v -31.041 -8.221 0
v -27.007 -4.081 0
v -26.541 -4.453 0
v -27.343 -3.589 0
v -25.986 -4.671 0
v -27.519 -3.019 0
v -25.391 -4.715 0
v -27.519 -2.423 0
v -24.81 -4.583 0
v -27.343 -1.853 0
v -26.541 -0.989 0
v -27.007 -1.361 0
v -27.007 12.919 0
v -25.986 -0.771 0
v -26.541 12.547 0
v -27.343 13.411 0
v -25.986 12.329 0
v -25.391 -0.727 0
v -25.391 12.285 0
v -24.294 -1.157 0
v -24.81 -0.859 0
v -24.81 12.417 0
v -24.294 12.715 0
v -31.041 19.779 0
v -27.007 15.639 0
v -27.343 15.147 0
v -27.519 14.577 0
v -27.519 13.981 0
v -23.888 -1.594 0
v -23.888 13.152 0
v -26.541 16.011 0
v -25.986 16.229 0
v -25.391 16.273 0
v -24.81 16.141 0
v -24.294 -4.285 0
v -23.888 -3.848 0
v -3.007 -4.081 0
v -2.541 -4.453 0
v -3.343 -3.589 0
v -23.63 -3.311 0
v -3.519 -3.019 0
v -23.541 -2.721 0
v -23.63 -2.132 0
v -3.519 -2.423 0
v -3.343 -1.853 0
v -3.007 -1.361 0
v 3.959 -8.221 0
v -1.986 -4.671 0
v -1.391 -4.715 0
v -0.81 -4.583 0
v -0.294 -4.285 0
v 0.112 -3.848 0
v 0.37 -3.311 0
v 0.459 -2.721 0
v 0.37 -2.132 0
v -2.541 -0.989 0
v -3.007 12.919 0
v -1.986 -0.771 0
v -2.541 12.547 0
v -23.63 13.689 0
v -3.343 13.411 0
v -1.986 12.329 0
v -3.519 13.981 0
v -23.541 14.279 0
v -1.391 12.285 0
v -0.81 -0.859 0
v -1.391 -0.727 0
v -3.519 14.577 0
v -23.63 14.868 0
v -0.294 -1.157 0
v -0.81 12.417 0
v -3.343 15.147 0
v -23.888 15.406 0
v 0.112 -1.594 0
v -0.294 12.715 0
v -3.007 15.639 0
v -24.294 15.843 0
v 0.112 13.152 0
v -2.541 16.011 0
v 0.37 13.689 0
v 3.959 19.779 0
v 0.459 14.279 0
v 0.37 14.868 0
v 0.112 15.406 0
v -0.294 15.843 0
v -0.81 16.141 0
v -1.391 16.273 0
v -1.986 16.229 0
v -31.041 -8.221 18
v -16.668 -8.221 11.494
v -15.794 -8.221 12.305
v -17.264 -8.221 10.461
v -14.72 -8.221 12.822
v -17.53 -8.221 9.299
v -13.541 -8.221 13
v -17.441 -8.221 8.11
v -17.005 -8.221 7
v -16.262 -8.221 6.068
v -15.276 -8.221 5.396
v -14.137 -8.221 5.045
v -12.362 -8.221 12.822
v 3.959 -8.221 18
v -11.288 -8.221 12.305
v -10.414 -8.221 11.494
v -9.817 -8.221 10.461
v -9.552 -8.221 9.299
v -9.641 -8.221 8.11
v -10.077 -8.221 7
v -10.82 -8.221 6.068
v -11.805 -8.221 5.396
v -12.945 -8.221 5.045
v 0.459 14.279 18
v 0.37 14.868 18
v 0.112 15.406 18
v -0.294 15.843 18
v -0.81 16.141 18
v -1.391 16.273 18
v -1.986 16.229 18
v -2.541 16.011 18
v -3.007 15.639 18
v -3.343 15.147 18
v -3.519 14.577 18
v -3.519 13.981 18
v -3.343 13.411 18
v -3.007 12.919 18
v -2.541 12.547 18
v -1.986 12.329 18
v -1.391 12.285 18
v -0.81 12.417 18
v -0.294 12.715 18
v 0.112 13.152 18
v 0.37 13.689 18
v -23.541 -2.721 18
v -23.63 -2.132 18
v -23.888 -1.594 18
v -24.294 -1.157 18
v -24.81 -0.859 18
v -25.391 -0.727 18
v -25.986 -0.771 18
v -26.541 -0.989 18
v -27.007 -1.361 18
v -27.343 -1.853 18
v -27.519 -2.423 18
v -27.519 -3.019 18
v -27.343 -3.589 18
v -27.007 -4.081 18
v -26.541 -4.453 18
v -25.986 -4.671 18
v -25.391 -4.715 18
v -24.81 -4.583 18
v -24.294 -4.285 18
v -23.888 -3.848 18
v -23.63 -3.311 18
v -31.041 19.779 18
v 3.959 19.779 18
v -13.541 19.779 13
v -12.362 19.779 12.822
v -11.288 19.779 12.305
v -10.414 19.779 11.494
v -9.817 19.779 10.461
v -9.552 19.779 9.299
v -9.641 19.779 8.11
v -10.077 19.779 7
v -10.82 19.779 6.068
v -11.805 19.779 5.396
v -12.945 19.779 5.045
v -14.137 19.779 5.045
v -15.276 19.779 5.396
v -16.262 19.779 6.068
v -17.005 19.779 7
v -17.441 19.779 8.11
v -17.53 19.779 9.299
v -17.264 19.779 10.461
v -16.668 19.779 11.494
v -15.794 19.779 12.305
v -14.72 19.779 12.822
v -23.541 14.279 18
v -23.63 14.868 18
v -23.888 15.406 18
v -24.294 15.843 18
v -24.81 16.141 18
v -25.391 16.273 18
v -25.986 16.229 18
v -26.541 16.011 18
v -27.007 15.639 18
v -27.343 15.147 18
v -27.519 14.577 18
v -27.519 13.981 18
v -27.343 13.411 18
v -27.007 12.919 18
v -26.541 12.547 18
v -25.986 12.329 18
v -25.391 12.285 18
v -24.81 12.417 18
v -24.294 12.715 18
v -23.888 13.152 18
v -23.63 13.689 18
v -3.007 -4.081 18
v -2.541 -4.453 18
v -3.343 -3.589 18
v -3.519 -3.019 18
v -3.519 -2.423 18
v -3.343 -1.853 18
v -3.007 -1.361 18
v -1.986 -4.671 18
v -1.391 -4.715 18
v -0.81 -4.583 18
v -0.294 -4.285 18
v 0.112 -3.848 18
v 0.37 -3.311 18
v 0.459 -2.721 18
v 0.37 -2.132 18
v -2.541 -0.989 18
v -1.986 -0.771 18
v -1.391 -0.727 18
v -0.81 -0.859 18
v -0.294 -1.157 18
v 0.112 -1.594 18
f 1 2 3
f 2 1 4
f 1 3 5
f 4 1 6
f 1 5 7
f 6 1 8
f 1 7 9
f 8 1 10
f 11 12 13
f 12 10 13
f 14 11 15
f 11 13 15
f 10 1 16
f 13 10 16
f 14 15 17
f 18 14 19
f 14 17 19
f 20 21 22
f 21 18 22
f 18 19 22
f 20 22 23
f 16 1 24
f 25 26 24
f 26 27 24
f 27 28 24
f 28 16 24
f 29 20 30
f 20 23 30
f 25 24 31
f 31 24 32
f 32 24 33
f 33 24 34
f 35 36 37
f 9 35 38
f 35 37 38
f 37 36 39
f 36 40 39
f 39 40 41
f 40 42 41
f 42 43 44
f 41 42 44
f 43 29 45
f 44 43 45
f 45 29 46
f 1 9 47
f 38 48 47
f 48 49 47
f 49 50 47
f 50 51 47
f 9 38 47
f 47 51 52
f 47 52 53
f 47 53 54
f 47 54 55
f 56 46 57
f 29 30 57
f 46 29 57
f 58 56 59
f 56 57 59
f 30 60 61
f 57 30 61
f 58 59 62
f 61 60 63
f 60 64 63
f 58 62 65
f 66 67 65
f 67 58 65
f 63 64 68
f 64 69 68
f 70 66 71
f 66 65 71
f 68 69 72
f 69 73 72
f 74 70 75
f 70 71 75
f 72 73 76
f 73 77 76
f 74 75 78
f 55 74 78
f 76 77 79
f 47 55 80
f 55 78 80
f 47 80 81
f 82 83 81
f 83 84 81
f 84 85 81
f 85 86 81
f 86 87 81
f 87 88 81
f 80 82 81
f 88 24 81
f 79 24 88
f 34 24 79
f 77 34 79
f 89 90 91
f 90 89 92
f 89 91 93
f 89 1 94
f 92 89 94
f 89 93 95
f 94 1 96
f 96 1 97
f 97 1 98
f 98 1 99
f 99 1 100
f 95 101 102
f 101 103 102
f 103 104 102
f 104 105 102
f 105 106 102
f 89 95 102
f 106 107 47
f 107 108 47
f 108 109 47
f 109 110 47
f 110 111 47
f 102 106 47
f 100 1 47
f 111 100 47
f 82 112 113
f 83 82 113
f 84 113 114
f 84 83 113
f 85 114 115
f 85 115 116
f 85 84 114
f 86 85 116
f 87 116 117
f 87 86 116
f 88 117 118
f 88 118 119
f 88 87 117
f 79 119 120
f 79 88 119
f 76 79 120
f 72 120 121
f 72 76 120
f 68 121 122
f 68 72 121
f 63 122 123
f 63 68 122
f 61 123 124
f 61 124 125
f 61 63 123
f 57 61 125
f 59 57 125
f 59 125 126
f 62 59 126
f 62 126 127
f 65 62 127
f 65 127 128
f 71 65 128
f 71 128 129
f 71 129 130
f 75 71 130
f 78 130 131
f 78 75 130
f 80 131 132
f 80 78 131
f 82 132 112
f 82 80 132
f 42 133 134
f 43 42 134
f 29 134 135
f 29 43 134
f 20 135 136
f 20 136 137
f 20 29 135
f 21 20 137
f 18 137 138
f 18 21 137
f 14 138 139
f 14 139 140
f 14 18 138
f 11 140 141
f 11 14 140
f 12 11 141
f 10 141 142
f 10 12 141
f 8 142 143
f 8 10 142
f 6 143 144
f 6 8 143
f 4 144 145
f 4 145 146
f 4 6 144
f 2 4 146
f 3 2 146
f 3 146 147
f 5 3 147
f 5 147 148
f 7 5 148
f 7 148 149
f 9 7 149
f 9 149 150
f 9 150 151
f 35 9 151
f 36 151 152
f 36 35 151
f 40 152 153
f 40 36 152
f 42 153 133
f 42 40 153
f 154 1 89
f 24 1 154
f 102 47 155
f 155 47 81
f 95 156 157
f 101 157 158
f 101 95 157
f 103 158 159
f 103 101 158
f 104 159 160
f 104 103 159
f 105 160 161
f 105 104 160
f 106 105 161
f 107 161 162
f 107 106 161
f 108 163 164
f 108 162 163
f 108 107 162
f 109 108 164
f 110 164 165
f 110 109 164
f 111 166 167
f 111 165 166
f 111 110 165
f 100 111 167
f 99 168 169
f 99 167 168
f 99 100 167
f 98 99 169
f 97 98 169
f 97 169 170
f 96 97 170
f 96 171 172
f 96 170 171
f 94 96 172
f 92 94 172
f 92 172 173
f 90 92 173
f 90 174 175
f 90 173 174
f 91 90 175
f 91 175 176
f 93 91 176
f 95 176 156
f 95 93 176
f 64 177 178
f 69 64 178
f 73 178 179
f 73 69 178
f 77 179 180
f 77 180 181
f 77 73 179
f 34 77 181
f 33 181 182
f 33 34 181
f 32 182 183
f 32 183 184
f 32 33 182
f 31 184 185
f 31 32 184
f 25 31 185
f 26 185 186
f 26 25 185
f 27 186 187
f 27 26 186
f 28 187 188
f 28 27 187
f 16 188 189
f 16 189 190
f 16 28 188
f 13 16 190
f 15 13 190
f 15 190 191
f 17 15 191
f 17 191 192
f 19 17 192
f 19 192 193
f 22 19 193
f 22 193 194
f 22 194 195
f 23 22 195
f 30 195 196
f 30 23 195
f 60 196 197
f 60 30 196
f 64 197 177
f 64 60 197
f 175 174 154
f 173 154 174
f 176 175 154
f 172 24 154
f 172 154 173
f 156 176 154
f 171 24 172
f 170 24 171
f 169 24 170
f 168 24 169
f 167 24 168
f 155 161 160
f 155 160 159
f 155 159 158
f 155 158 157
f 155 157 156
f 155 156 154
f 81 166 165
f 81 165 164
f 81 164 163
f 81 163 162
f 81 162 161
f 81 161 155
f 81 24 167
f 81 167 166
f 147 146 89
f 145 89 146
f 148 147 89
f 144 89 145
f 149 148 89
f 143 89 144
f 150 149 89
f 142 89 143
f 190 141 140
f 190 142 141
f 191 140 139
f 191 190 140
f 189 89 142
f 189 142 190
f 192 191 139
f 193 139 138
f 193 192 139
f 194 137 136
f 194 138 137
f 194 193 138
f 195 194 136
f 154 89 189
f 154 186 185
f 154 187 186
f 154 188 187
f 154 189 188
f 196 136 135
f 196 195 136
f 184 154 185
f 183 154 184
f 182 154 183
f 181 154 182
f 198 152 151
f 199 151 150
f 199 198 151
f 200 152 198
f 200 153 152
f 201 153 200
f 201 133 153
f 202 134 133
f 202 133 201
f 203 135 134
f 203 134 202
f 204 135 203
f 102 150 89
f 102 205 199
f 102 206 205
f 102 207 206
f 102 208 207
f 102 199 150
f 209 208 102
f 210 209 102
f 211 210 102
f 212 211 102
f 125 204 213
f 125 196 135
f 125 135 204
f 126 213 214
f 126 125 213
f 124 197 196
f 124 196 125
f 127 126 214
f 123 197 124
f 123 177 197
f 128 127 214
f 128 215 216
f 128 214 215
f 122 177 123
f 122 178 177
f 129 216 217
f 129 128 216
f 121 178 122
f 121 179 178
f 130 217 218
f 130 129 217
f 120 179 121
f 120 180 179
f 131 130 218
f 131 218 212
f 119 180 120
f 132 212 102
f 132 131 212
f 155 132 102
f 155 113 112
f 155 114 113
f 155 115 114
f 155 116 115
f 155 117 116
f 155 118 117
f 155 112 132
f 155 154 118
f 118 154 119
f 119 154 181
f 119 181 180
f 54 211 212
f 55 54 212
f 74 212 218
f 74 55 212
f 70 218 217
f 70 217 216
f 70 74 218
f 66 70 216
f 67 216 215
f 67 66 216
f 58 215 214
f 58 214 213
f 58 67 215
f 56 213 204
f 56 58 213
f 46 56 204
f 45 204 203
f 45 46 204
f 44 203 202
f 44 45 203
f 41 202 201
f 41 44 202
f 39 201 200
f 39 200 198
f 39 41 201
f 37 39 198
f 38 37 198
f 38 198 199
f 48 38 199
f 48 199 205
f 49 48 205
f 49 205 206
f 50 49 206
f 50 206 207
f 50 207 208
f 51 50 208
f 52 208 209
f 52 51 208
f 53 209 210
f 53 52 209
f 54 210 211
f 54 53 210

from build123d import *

# Parameters (mm, degrees)
SKETCH1_W           = 35
SKETCH1_H           = 28
SKETCH1_R           = 2
BOSS_EXTRUDE1_DEPTH = 18
SKETCH2_R           = 4
CUT_EXTRUDE1_DEPTH  = 43.721340305


with BuildPart() as part:
    # Sketch1 → Boss-Extrude1 (new body)
    with BuildSketch(Plane.XY):
        with Locations((-13.540903953, 5.778964085)):
            Rectangle(SKETCH1_W, SKETCH1_H)
        with Locations((-25.540903953, 14.278964085)):
            Circle(SKETCH1_R, mode=Mode.SUBTRACT)
        with Locations((-1.540903953, 14.278964085)):
            Circle(SKETCH1_R, mode=Mode.SUBTRACT)
        with Locations((-25.540903953, -2.721035915)):
            Circle(SKETCH1_R, mode=Mode.SUBTRACT)
        with Locations((-1.540903953, -2.721035915)):
            Circle(SKETCH1_R, mode=Mode.SUBTRACT)
    extrude(amount=BOSS_EXTRUDE1_DEPTH)

    # Sketch2 → Cut-Extrude1 (cut, through all)
    with BuildSketch(Plane(origin=(-4.261939868, -8.221035915, 0), x_dir=(0, 0, -1), z_dir=(0, 1, 0))):
        with Locations(Location((-9, 9.278964085, 0), (0, 0, 180))):
            Circle(SKETCH2_R)
    extrude(amount=CUT_EXTRUDE1_DEPTH, mode=Mode.SUBTRACT)


solid = part.part
